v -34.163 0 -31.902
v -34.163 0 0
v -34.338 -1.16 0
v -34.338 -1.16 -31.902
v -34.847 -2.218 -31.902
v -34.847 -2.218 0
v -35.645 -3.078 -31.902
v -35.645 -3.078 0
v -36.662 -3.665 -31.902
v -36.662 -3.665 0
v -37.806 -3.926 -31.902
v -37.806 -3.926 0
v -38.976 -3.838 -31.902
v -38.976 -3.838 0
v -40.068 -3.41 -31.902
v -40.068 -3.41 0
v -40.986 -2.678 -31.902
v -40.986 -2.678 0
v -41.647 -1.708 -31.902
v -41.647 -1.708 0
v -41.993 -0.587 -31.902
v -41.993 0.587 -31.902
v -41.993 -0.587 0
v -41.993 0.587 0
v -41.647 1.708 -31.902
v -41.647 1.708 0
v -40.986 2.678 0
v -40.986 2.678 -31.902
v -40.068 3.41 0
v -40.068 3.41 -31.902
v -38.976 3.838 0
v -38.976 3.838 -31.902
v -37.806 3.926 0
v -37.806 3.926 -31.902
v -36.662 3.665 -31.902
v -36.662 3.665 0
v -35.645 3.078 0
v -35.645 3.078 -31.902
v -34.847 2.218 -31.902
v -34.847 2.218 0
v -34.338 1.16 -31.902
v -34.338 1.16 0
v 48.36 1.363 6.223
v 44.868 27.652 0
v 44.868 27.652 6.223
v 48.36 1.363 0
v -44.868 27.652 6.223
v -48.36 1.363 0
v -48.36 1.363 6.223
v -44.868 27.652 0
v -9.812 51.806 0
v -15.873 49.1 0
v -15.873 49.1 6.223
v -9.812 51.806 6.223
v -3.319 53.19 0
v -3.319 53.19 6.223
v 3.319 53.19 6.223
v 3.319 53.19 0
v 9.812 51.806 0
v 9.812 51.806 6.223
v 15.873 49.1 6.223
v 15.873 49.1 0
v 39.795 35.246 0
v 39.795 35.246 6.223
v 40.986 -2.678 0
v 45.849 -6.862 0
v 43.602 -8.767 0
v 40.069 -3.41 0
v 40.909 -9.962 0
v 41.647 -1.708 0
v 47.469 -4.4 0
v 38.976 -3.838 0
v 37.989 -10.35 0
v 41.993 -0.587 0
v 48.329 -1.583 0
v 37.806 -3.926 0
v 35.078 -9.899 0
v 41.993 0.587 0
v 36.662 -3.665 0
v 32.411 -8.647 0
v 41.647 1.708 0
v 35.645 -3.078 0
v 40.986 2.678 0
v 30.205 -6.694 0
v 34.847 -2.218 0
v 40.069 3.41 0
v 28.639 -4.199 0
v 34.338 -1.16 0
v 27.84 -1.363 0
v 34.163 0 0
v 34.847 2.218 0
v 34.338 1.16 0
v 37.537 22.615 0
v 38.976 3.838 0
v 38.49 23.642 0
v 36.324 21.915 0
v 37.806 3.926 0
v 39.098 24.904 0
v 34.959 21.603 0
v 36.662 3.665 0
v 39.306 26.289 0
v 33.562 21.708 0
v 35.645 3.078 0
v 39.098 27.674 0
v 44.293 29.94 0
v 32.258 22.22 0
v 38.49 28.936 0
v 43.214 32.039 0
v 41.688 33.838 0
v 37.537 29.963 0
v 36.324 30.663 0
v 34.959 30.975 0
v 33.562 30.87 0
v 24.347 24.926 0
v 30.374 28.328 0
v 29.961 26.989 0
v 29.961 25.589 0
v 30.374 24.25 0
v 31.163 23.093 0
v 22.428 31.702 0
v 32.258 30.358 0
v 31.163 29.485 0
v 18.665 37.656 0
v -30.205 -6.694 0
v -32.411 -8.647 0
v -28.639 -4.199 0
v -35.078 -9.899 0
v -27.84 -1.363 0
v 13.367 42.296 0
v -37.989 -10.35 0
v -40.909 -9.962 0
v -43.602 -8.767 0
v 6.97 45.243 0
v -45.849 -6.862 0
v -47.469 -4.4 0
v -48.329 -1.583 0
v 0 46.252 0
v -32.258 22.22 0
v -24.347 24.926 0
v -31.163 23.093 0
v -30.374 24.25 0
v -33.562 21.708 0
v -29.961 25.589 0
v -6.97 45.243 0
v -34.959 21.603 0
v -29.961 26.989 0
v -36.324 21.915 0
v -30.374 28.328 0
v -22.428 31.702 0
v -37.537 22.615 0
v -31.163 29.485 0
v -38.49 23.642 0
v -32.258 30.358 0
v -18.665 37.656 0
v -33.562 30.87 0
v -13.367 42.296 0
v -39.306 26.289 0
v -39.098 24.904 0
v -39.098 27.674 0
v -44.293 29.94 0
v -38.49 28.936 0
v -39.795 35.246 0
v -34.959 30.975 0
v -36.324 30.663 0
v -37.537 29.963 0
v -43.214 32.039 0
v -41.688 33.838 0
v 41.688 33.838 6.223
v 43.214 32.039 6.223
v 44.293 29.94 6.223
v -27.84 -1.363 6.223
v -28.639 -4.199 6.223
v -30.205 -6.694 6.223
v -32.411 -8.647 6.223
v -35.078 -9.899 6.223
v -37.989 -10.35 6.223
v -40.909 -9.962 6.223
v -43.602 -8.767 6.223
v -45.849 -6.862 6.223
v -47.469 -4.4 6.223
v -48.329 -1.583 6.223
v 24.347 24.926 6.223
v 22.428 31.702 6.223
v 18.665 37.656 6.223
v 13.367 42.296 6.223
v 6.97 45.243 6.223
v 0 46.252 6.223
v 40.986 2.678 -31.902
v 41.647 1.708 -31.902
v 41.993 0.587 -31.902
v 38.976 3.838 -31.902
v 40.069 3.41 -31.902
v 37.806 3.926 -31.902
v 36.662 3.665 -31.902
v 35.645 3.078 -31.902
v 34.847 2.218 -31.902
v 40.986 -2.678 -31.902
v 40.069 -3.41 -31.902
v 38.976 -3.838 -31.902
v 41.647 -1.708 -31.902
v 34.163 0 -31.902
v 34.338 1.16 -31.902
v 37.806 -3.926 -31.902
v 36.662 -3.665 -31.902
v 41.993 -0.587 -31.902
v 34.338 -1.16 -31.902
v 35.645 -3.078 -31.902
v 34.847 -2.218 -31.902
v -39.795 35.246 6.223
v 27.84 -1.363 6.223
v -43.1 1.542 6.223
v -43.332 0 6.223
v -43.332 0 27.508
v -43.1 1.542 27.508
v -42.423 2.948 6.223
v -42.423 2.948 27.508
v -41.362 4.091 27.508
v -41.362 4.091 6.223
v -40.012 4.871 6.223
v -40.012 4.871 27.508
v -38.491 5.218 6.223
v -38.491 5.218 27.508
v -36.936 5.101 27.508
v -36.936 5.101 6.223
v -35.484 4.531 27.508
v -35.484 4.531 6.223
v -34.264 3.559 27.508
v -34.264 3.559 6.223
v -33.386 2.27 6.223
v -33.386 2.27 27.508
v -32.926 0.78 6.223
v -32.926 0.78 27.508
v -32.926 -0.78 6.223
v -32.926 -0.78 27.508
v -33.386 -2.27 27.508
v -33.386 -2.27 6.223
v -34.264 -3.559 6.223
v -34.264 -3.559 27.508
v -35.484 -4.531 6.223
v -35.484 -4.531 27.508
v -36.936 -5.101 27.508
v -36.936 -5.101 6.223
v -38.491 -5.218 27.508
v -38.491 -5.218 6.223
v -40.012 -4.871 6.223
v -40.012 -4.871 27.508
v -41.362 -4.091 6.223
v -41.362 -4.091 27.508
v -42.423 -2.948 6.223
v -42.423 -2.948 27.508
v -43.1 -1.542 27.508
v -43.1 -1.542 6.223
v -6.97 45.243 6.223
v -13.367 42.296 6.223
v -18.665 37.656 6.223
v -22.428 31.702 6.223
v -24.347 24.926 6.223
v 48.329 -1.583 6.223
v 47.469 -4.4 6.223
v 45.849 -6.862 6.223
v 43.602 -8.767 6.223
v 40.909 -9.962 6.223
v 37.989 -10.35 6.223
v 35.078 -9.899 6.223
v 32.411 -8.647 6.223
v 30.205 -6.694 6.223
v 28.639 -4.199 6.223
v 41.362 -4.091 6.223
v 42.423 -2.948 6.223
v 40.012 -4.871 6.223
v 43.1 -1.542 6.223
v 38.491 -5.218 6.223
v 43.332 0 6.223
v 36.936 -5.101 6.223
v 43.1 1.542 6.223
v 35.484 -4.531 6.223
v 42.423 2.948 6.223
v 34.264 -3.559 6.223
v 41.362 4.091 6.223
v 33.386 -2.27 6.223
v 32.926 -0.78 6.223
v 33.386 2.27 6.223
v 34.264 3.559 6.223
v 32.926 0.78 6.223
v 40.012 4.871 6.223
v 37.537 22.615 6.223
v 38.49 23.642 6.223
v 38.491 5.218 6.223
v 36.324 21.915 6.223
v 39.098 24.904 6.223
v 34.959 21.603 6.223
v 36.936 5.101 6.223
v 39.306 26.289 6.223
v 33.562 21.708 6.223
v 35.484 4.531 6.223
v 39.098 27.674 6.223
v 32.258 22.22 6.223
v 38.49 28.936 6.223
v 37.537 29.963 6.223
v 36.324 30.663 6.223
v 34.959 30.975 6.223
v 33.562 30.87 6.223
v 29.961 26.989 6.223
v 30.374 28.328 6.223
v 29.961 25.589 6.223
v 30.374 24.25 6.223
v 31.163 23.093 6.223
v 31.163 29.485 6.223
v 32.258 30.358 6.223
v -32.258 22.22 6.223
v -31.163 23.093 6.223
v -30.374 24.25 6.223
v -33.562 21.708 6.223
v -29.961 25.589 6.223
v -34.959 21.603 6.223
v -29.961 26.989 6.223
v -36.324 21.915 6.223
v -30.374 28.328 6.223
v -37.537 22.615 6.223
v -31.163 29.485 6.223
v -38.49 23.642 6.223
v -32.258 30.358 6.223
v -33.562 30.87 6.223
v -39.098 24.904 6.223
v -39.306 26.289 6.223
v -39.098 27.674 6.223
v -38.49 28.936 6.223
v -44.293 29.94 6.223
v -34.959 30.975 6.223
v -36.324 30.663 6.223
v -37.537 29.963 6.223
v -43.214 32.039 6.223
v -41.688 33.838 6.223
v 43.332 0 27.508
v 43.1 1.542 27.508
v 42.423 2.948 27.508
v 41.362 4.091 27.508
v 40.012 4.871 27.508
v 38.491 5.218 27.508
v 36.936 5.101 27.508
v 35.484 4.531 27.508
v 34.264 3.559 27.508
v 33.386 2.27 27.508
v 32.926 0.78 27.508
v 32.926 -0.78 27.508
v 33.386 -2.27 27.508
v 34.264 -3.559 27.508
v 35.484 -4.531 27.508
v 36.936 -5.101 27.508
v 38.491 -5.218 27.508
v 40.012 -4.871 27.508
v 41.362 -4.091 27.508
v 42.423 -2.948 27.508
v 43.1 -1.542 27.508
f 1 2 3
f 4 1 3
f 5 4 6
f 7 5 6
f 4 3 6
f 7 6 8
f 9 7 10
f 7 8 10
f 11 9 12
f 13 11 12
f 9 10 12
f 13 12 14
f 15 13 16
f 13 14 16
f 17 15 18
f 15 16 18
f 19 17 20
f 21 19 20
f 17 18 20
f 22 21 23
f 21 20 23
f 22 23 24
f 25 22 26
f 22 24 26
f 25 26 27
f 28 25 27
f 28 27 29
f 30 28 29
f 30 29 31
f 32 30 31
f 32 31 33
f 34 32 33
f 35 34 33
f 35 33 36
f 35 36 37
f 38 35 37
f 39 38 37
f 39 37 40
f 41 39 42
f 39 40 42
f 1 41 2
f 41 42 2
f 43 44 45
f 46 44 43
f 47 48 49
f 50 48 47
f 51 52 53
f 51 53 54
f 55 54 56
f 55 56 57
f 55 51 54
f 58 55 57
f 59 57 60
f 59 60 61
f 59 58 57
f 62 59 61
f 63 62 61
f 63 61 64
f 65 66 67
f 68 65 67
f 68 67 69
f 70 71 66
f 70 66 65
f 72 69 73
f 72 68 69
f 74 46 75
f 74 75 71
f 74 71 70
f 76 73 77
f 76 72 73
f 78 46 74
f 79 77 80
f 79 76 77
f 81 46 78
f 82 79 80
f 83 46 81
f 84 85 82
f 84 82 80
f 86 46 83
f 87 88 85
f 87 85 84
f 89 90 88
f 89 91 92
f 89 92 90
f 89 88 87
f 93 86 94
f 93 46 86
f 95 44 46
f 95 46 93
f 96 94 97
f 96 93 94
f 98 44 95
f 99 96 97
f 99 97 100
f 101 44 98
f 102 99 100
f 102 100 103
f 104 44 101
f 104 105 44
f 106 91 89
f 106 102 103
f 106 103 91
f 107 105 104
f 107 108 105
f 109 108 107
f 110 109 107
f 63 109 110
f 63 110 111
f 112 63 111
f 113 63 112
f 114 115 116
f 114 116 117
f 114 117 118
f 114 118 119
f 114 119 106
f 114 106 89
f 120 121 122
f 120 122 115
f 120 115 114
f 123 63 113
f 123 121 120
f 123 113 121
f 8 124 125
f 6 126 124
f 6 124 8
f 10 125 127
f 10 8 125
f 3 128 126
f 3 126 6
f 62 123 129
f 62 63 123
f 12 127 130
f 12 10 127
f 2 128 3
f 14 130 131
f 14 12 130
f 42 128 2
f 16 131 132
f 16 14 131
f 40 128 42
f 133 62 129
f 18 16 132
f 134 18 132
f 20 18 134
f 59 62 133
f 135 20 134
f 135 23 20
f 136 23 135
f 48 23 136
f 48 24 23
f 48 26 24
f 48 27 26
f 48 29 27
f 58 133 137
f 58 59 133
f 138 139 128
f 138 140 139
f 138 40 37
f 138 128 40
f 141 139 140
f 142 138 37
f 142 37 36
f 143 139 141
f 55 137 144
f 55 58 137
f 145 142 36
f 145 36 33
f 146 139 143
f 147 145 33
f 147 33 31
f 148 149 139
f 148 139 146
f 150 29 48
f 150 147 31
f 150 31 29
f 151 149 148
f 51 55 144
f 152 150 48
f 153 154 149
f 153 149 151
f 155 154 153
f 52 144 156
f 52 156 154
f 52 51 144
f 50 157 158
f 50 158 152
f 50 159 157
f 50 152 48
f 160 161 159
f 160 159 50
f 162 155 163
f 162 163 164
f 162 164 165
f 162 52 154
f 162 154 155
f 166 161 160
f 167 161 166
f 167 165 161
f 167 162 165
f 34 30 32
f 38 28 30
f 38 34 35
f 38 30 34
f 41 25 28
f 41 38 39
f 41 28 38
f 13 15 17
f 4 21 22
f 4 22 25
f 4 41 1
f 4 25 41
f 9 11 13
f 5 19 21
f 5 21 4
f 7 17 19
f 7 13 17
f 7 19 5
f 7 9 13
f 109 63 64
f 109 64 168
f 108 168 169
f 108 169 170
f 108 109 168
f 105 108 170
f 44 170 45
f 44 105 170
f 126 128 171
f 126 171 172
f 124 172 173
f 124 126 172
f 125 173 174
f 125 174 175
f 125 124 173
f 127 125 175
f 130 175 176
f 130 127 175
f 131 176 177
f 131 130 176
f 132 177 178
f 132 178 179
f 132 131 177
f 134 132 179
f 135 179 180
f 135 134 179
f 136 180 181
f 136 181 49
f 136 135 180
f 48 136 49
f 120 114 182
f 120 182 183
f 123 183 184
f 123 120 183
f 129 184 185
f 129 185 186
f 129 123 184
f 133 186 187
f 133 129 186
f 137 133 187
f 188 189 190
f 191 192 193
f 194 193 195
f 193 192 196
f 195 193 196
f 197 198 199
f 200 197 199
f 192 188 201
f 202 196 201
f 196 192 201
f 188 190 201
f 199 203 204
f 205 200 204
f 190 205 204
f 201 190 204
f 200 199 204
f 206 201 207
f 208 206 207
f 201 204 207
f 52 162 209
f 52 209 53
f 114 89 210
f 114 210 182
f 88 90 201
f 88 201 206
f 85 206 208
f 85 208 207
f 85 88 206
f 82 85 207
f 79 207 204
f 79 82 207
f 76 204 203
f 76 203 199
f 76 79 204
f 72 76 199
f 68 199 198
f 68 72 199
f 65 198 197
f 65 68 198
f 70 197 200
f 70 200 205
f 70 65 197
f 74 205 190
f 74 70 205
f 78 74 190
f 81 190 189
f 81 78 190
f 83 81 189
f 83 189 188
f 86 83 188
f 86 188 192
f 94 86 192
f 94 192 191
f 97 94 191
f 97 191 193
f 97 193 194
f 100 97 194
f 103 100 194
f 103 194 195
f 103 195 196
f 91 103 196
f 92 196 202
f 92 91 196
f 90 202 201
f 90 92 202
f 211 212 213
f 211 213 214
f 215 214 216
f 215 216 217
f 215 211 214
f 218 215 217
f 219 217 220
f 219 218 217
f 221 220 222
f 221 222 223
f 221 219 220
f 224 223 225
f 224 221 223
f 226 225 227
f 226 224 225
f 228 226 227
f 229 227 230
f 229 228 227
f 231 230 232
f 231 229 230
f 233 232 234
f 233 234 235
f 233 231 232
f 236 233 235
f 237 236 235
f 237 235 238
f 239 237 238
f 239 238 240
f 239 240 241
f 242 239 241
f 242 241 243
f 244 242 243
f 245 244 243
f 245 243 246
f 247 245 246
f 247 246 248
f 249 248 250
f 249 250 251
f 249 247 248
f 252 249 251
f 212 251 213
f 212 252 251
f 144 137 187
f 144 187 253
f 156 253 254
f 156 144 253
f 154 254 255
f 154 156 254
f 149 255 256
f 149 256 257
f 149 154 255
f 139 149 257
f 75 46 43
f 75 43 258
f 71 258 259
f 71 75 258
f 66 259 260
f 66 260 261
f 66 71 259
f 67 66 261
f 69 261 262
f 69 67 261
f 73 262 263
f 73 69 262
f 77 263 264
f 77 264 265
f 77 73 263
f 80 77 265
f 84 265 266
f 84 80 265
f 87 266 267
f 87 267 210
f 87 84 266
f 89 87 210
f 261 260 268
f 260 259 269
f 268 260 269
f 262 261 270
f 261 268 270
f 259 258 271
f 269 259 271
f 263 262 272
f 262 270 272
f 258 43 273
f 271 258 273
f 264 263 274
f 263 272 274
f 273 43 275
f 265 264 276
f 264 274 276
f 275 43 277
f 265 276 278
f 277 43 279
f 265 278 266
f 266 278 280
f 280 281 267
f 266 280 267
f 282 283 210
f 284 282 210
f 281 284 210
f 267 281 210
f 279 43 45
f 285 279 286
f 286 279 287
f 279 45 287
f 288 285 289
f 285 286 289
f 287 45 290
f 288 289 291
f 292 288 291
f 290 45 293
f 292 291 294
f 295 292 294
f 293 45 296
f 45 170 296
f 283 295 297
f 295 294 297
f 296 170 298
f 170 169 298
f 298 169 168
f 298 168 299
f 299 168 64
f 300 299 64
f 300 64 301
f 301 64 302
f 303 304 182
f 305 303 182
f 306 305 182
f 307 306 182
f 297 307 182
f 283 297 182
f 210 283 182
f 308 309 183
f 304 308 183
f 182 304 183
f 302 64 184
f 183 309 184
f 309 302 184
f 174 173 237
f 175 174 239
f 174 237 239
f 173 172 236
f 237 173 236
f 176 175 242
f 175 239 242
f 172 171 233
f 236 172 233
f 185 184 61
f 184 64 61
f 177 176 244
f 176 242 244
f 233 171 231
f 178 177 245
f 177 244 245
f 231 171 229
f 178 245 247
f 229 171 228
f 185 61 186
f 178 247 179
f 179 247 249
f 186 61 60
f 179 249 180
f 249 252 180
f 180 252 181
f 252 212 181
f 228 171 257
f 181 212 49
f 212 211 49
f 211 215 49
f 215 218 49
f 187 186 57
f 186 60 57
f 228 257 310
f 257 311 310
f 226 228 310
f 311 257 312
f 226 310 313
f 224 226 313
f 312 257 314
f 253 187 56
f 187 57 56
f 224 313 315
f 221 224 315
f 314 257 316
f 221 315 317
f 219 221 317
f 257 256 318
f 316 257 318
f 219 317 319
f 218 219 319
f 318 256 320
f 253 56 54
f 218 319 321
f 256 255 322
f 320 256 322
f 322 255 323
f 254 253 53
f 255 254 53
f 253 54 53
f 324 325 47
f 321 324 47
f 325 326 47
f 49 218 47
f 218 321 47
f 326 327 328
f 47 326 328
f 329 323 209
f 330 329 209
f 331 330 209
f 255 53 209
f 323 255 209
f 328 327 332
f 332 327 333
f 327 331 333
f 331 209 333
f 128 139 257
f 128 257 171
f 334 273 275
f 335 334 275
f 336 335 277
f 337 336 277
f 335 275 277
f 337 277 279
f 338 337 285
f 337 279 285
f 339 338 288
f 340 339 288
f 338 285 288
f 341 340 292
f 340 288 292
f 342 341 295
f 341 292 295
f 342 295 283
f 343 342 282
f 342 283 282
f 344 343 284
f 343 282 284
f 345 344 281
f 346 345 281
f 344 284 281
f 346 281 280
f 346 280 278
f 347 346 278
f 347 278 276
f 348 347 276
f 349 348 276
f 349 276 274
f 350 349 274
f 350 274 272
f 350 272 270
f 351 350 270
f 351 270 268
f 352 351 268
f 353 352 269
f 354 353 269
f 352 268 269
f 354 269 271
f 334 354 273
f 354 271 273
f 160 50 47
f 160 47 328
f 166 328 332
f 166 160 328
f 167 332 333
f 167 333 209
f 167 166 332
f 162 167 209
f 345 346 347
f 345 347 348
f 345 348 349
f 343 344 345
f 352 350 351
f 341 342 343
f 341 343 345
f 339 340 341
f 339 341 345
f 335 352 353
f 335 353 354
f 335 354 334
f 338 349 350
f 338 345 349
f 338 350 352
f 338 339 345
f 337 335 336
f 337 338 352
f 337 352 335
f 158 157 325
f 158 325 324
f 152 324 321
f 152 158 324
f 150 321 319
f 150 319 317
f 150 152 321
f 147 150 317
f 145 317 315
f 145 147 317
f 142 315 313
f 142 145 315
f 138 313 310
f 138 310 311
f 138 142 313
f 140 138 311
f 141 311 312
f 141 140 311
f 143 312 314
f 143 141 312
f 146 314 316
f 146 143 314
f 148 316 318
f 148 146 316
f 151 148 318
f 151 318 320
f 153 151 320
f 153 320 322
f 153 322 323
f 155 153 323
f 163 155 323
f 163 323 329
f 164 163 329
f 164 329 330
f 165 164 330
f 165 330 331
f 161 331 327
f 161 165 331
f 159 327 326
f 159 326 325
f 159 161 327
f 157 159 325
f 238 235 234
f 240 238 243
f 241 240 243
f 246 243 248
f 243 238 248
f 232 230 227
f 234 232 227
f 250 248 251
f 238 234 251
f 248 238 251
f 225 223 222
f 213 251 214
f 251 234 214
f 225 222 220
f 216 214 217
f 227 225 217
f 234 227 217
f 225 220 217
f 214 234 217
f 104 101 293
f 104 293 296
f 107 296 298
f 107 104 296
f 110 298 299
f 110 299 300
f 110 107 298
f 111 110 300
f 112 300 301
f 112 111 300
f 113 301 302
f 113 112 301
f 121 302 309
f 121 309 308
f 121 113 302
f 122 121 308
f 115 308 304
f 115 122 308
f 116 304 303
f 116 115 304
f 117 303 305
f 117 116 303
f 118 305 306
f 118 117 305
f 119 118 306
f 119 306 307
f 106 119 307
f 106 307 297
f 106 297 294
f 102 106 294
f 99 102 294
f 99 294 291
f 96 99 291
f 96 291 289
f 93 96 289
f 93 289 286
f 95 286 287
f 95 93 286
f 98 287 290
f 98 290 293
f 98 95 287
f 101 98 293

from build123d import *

# Parameters (mm, degrees)
SKETCH1_R           = 4.699
BOSS_EXTRUDE1_DEPTH = 6.223
SKETCH2_R           = 5.2324
BOSS_EXTRUDE2_DEPTH = 21.2852
SKETCH3_R           = 3.937
BOSS_EXTRUDE3_DEPTH = 31.9024


with BuildPart() as part:
    # Sketch1 → Boss-Extrude1 (new body)
    with BuildSketch(Plane.XY):
        with BuildLine():
            Line((27.839647422, -1.363090318), (24.347147422, 24.925909682))
            ThreePointArc((24.347147422, 24.925909682), (16.183361565, 40.166897281), (0, 46.252446639))
            ThreePointArc((0, 46.252446639), (-16.183361565, 40.166897281), (-24.347147422, 24.925909682))
            Line((-24.347147422, 24.925909682), (-27.839647422, -1.363090318))
            ThreePointArc((-27.839647422, -1.363090318), (-39.463090318, -10.260352578), (-48.360352578, 1.363090318))
            Line((-48.360352578, 1.363090318), (-44.867852578, 27.652090318))
            ThreePointArc((-44.867852578, 27.652090318), (-43.214104666, 32.038713591), (-39.794788795, 35.245834553))
            Line((-39.794788795, 35.245834553), (-15.873370018, 49.099758822))
            ThreePointArc((-15.873370018, 49.099758822), (0, 53.364446639), (15.873370018, 49.099758822))
            Line((15.873370018, 49.099758822), (39.794788795, 35.245834553))
            ThreePointArc((39.794788795, 35.245834553), (43.214104666, 32.038713591), (44.867852578, 27.652090318))
            Line((44.867852578, 27.652090318), (48.360352578, 1.363090318))
            ThreePointArc((48.360352578, 1.363090318), (39.463090318, -10.260352578), (27.839647422, -1.363090318))
        make_face()
        with Locations((34.6075, 26.289)):
            Circle(SKETCH1_R, mode=Mode.SUBTRACT)
        with Locations(Location((-34.6075, 26.289, 0), (0, 0, 180))):
            Circle(SKETCH1_R, mode=Mode.SUBTRACT)
    extrude(amount=BOSS_EXTRUDE1_DEPTH)

    # Sketch2 → Boss-Extrude2 (add)
    with BuildSketch(Plane.XY.offset(6.223)):
        with Locations((38.1, 0)):
            Circle(SKETCH2_R)
    boss_extrude2 = extrude(amount=BOSS_EXTRUDE2_DEPTH)

    # Mirror1: Boss-Extrude2 across plane
    add(boss_extrude2.mirror(Plane(origin=(0, 0, 0), x_dir=(0, 0, 1), z_dir=(1, 0, 0))))

    # Sketch3 → Boss-Extrude3 (add)
    with BuildSketch(Plane(origin=(0, 0, 0), x_dir=(-1, 0, 0), z_dir=(0, 0, -1))):
        with Locations(Location((38.1, 0, 0), (0, 0, 180))):
            Circle(SKETCH3_R)
    boss_extrude3 = extrude(amount=BOSS_EXTRUDE3_DEPTH)

    # Mirror2: Boss-Extrude3 across plane
    add(boss_extrude3.mirror(Plane(origin=(0, 0, 0), x_dir=(0, 0, 1), z_dir=(1, 0, 0))))


solid = part.part
